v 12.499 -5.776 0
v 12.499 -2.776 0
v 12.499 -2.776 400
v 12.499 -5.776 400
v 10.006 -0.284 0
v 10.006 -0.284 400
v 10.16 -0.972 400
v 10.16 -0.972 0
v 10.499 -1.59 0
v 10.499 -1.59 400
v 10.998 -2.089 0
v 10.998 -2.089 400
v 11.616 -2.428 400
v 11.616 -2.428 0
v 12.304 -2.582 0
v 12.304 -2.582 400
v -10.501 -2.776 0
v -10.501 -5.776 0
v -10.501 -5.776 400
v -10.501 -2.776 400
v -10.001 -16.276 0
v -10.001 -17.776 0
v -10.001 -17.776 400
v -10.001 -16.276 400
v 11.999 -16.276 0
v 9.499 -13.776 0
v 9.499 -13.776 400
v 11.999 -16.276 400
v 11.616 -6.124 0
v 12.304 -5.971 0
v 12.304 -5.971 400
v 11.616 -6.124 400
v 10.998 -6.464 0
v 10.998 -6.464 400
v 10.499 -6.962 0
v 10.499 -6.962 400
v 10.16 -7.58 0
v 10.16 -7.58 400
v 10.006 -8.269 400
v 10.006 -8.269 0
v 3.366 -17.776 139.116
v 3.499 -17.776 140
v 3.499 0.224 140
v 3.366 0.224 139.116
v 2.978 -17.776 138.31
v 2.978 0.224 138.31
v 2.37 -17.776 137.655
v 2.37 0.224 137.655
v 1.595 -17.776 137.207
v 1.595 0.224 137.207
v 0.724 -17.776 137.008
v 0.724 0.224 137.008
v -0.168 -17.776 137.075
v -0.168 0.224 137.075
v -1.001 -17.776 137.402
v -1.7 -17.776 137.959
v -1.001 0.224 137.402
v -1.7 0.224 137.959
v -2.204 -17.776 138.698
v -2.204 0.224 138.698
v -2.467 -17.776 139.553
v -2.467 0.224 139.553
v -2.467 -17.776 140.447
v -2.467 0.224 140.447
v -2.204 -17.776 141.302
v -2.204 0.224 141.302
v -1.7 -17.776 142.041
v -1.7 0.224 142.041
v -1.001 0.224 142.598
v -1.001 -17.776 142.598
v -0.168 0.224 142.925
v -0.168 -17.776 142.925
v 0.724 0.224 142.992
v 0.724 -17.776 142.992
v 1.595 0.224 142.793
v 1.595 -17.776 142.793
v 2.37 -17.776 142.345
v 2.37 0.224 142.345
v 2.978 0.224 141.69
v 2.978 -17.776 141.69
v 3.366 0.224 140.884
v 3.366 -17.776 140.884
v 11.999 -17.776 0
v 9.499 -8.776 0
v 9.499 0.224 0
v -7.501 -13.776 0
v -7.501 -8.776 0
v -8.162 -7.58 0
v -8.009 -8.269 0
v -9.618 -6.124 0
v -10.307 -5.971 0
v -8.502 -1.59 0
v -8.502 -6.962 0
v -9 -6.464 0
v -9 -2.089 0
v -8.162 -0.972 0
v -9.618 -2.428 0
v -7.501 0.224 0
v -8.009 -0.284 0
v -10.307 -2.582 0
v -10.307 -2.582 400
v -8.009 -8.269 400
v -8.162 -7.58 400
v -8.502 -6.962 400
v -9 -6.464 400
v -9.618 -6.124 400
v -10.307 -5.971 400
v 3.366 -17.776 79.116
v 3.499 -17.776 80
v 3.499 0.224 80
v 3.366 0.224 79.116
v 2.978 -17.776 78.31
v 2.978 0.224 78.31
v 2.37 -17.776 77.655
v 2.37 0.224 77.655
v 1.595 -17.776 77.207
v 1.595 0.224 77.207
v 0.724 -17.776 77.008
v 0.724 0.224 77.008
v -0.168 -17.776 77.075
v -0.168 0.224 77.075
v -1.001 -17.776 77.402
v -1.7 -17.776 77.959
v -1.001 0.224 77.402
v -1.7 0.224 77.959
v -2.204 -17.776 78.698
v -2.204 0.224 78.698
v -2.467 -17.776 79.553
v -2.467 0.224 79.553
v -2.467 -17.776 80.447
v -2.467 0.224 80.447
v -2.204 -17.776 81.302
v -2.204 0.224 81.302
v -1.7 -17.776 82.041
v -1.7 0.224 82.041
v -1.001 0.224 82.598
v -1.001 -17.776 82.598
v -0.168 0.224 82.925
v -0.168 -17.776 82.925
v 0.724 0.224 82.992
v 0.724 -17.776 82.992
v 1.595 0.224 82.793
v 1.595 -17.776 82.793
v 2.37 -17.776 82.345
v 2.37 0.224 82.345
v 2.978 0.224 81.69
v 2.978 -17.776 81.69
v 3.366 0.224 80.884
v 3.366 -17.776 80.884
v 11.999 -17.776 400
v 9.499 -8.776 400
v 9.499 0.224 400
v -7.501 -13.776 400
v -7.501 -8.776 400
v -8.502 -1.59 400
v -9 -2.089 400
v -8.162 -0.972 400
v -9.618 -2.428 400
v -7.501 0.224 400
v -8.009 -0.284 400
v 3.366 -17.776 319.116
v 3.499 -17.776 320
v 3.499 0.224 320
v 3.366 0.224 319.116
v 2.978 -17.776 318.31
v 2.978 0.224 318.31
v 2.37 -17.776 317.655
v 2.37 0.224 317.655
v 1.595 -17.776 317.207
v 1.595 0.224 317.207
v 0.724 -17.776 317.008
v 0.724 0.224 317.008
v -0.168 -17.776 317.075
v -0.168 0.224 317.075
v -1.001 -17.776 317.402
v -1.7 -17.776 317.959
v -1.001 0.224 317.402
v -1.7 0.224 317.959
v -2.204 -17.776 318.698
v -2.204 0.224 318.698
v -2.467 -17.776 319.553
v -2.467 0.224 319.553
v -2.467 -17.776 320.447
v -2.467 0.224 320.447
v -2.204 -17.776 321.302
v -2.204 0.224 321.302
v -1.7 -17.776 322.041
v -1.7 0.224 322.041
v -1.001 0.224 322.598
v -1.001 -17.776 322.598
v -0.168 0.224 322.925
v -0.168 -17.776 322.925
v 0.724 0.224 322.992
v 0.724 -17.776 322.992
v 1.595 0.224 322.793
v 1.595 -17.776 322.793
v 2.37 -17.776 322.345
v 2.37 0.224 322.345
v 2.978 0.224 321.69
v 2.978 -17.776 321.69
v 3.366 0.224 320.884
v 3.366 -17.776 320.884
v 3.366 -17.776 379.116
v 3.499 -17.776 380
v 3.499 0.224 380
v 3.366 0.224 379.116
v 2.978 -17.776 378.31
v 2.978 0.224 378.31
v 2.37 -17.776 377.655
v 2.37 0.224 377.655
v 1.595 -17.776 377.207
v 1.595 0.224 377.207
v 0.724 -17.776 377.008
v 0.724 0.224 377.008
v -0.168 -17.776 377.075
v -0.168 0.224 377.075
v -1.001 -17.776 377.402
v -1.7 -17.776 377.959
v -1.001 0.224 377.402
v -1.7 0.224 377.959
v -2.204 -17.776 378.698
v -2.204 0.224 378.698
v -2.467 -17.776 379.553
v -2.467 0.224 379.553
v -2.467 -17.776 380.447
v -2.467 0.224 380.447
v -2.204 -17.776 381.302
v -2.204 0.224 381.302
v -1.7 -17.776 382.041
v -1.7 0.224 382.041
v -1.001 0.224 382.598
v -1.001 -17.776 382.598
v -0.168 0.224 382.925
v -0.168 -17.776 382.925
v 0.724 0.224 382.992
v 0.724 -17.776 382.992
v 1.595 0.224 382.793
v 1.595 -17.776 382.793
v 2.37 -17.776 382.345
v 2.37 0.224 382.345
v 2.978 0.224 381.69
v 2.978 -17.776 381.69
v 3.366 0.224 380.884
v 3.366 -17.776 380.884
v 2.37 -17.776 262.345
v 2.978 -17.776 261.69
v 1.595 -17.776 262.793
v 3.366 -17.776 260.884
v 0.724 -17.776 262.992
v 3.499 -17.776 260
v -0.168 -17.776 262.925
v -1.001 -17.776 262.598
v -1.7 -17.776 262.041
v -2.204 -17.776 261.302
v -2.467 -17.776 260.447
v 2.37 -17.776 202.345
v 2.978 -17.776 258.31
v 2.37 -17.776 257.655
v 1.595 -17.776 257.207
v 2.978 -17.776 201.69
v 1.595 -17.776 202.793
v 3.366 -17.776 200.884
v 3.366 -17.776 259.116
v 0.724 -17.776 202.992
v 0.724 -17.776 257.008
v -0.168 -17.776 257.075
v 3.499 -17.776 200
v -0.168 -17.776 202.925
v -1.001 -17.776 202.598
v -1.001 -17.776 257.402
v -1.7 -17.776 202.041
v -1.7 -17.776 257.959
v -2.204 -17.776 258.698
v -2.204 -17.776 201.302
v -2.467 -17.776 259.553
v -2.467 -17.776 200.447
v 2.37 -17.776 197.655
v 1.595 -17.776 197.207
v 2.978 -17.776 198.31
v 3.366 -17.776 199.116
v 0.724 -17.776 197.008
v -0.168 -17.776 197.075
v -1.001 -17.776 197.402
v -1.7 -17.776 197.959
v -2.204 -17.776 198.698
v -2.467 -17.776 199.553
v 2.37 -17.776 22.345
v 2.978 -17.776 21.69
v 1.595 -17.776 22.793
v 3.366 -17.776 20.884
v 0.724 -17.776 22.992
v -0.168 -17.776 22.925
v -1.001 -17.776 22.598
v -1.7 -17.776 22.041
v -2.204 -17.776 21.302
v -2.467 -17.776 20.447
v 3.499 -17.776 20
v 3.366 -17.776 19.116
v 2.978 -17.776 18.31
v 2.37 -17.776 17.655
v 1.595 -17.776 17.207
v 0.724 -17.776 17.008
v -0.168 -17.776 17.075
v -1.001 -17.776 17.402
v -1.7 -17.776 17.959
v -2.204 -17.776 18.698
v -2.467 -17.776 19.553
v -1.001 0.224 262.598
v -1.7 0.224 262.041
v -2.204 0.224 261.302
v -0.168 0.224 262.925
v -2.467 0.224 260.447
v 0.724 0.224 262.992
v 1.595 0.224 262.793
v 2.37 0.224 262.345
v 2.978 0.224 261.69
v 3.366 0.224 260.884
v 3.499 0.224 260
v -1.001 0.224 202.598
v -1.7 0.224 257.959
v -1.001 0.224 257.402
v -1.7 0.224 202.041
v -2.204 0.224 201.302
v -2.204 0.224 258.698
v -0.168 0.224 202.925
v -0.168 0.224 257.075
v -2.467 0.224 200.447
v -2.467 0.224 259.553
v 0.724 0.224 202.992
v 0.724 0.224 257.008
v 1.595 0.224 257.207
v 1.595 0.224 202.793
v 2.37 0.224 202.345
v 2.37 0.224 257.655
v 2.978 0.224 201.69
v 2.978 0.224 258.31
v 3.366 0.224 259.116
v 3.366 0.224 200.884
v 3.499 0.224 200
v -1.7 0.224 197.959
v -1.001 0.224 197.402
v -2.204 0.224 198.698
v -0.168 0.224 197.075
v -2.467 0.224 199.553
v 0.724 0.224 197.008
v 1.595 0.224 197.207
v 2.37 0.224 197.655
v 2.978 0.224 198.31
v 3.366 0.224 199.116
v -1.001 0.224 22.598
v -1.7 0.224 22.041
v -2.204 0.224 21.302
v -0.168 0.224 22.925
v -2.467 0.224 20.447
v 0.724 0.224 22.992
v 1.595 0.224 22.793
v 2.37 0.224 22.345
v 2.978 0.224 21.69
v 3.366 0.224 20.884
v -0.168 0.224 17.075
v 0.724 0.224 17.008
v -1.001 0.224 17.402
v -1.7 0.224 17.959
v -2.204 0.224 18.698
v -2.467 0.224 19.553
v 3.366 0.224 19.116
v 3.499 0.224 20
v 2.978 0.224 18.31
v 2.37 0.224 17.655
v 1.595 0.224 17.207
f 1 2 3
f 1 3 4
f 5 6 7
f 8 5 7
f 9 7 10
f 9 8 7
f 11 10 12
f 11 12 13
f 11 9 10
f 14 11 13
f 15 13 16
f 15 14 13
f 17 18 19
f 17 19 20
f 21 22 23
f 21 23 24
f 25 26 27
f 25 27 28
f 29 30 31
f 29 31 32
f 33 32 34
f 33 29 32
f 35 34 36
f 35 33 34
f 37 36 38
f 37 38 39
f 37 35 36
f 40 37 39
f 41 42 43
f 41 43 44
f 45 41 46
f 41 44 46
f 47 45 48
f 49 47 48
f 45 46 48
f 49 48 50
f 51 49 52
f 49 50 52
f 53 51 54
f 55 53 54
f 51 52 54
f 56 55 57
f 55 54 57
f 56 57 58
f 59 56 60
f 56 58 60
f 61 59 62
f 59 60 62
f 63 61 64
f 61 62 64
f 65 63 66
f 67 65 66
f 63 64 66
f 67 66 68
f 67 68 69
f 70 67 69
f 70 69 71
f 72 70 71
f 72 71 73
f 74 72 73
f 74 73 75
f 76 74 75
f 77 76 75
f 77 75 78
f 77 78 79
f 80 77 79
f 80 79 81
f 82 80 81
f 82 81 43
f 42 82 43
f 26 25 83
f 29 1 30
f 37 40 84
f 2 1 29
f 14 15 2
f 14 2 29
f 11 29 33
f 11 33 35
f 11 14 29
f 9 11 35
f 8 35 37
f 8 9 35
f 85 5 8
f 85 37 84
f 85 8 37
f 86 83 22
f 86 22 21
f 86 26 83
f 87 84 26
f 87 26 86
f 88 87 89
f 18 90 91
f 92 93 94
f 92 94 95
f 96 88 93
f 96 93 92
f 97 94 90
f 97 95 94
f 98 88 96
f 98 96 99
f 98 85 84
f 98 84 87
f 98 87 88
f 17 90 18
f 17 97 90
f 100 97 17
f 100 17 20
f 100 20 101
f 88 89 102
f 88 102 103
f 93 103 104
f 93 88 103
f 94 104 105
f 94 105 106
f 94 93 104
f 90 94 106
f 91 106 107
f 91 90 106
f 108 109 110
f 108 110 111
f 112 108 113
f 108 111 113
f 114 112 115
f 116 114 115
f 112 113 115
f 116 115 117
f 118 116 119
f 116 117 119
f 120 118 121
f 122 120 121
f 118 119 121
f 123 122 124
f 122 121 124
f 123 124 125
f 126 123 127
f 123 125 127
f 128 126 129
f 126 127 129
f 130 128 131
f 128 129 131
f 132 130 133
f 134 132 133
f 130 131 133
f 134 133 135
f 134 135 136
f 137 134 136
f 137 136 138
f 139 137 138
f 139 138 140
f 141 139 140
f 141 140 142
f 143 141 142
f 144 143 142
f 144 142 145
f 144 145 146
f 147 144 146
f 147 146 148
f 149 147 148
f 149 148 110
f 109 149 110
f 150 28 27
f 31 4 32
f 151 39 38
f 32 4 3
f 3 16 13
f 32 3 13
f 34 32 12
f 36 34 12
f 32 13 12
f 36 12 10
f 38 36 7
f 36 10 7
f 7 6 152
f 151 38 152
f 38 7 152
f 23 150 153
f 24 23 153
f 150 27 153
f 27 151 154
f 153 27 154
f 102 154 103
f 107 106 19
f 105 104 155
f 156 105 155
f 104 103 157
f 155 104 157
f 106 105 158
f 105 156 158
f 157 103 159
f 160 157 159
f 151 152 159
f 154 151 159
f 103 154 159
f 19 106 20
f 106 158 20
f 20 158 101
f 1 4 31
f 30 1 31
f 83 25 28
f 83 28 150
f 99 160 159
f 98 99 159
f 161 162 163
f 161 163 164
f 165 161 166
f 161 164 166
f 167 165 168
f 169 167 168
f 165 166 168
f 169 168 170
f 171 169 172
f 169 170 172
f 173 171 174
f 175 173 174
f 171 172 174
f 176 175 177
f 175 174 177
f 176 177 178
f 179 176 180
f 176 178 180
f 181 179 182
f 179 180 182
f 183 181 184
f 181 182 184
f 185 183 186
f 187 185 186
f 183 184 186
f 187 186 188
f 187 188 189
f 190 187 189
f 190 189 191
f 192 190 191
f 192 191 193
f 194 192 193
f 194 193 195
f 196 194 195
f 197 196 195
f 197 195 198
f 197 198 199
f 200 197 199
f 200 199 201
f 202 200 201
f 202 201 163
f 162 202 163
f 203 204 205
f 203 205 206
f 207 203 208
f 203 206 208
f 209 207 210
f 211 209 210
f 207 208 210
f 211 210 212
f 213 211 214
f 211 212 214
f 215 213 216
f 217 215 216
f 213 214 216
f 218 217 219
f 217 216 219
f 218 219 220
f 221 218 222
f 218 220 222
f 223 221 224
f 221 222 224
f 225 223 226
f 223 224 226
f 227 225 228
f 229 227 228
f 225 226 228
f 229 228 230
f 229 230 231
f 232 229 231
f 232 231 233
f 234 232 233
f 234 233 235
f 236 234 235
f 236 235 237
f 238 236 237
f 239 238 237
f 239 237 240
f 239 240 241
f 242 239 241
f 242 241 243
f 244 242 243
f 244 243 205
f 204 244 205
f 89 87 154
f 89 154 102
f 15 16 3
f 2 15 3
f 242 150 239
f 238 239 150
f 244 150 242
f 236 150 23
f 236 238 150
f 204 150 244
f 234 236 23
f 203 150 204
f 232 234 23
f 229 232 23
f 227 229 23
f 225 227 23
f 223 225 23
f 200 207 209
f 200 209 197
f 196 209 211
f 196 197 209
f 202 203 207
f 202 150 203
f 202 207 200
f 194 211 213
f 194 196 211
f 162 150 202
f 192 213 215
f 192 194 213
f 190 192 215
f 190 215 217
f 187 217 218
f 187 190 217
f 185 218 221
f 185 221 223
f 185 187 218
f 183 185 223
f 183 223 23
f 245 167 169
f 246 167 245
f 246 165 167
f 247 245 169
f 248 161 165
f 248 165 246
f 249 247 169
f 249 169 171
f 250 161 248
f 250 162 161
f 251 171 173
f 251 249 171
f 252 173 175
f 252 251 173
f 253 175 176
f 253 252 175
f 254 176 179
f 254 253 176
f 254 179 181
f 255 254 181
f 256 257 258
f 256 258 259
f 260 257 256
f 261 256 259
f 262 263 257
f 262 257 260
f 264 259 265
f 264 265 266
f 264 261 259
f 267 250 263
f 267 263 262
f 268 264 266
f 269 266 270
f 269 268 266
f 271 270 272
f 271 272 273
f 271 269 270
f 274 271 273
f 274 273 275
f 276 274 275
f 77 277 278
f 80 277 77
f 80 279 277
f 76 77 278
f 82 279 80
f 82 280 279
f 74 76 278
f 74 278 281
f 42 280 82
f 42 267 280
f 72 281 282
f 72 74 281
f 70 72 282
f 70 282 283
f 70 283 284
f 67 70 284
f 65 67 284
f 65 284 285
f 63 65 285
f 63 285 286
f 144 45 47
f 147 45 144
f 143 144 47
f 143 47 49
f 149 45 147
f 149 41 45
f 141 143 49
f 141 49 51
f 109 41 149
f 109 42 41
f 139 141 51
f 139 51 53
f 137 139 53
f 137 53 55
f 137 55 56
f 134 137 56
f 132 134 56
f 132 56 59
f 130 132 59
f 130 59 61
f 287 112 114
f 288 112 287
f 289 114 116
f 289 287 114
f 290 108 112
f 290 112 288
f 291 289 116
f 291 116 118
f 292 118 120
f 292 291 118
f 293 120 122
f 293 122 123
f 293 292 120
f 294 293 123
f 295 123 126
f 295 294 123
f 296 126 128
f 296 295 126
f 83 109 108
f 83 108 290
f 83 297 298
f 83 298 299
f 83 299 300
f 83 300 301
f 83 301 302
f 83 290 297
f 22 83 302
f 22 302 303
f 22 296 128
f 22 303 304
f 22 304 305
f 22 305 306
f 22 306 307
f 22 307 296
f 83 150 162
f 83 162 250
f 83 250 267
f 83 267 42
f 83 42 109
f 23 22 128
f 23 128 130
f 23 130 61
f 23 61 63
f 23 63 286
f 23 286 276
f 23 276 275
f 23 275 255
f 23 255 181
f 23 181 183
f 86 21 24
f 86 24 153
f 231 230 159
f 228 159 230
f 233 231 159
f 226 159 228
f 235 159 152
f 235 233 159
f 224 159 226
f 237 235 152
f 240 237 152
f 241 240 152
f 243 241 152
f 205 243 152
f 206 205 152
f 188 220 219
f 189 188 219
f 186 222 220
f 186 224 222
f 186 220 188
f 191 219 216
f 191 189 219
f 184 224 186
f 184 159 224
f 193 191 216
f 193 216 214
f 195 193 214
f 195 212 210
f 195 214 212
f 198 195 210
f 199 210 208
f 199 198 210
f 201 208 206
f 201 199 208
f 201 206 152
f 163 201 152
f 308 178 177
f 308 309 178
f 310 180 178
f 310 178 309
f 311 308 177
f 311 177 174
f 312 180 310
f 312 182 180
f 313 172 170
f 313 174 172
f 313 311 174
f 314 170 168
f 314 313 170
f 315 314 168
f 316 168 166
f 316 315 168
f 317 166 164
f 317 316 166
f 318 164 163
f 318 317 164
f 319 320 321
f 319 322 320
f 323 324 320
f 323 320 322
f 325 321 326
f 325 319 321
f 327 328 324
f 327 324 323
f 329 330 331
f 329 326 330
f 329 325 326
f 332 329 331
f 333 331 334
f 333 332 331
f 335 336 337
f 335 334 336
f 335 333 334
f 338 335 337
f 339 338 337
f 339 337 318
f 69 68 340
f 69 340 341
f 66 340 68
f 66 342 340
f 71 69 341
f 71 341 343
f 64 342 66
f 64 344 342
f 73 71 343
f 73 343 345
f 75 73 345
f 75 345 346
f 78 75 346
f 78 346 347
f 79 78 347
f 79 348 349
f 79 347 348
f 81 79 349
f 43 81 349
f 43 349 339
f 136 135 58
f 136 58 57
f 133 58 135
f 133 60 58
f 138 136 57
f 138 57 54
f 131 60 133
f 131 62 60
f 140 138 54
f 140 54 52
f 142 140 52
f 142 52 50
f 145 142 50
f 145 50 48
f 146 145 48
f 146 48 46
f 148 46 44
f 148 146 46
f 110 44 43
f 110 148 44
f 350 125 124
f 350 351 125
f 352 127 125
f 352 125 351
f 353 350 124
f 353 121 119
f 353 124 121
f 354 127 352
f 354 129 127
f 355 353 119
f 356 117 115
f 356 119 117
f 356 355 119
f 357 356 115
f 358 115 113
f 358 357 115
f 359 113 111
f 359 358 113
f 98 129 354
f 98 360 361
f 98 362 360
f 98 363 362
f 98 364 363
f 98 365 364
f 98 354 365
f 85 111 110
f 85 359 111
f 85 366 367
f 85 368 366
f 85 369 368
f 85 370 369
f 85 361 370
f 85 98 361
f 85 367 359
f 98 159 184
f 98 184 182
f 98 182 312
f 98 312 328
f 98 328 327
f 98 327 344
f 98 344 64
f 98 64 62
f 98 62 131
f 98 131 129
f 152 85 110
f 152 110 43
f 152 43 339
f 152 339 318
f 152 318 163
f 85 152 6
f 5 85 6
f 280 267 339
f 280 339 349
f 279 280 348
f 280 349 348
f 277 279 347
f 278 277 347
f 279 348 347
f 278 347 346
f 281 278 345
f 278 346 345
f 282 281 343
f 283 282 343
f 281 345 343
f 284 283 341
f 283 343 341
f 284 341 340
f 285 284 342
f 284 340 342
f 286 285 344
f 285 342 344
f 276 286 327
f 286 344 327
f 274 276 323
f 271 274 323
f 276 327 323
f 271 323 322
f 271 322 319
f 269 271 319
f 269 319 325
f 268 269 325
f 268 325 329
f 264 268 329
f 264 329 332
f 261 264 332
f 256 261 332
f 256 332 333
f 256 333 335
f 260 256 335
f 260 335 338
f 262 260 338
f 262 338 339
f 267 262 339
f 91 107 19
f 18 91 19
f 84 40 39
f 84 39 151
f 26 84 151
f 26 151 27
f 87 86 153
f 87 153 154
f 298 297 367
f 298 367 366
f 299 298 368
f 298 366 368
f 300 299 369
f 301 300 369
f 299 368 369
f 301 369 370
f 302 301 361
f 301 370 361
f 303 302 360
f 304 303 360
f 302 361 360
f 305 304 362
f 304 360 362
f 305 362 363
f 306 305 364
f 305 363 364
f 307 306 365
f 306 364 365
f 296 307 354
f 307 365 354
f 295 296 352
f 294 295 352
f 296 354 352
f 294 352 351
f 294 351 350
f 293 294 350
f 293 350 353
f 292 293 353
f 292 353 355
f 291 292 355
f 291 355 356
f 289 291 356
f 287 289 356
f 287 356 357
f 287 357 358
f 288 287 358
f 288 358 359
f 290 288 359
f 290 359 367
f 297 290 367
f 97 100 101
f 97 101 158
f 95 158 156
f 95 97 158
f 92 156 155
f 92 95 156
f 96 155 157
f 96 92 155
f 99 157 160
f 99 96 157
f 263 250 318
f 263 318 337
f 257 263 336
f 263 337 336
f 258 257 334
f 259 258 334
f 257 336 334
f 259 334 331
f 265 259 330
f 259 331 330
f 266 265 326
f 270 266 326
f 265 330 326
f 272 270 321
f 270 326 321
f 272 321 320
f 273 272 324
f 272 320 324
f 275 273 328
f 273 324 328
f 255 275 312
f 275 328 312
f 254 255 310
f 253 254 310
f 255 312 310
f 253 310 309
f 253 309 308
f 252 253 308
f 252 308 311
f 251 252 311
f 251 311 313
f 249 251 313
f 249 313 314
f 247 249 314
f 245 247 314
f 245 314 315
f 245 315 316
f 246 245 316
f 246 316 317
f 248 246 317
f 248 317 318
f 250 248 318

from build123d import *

# Parameters (mm, degrees)
ESTRUSIONE_ESTRUSIONE1_DEPTH      = 400
SCHIZZO2_R                        = 3
TAGLIO_ESTRUSIONE1_DEPTH          = 19
RIPETIZIONE_A_L1_COUNT            = 4
RIPETIZIONE_A_L1_PITCH            = 60
RIPETIZIONE_A_L2_COPY_1_SKETCH_R  = 3
RIPETIZIONE_A_L2_COPY_1_DEPTH     = 19
RIPETIZIONE_A_L2_COPY_2_SKETCH_R  = 3
RIPETIZIONE_A_L2_COPY_2_DEPTH     = 19
RIPETIZIONE_A_L2_COPY_3_SKETCH_R  = 3
RIPETIZIONE_A_L2_COPY_3_DEPTH     = 19
RIPETIZIONE_A_L2_COPY_4_SKETCH_R  = 3
RIPETIZIONE_A_L2_COPY_4_DEPTH     = 19
RIPETIZIONE_A_L2_COPY_5_SKETCH_R  = 3
RIPETIZIONE_A_L2_COPY_5_DEPTH     = 19
RIPETIZIONE_A_L2_COPY_6_SKETCH_R  = 3
RIPETIZIONE_A_L2_COPY_6_DEPTH     = 19
RIPETIZIONE_A_L2_COPY_7_SKETCH_R  = 3
RIPETIZIONE_A_L2_COPY_7_DEPTH     = 19
RIPETIZIONE_A_L2_COPY_8_SKETCH_R  = 3
RIPETIZIONE_A_L2_COPY_8_DEPTH     = 19
RIPETIZIONE_A_L2_COPY_9_SKETCH_R  = 3
RIPETIZIONE_A_L2_COPY_9_DEPTH     = 19
RIPETIZIONE_A_L2_COPY_10_SKETCH_R = 3
RIPETIZIONE_A_L2_COPY_10_DEPTH    = 19
RIPETIZIONE_A_L2_COPY_11_SKETCH_R = 3
RIPETIZIONE_A_L2_COPY_11_DEPTH    = 19
RIPETIZIONE_A_L2_COPY_12_SKETCH_R = 3
RIPETIZIONE_A_L2_COPY_12_DEPTH    = 19


with BuildPart() as part:
    # Schizzo1 → Estrusione-Estrusione1 (new body)
    with BuildSketch(Plane.XY):
        with BuildLine():
            Line((-10.001211602, -16.276222172), (-7.501211602, -13.776222172))
            Line((-7.501211602, -13.776222172), (-7.501211602, -8.776222172))
            Line((-7.501211602, -8.776222172), (-8.008796188, -8.268637585))
            ThreePointArc((-8.008796188, -8.268637585), (-8.733444649, -6.695460987), (-10.306621247, -5.970812526))
            Line((-10.306621247, -5.970812526), (-10.501211602, -5.776222172))
            Line((-10.501211602, -5.776222172), (-10.501211602, -2.776222172))
            Line((-10.501211602, -2.776222172), (-10.306621247, -2.581631817))
            ThreePointArc((-10.306621247, -2.581631817), (-8.733444649, -1.856983356), (-8.008796188, -0.283806758))
            Line((-8.008796188, -0.283806758), (-7.501211602, 0.223777828))
            Line((-7.501211602, 0.223777828), (9.498788398, 0.223777828))
            Line((9.498788398, 0.223777828), (10.006372984, -0.283806758))
            ThreePointArc((10.006372984, -0.283806758), (10.731021445, -1.856983356), (12.304198043, -2.581631817))
            Line((12.304198043, -2.581631817), (12.498788398, -2.776222172))
            Line((12.498788398, -2.776222172), (12.498788398, -5.776222172))
            Line((12.498788398, -5.776222172), (12.304198043, -5.970812526))
            ThreePointArc((12.304198043, -5.970812526), (10.731021445, -6.695460987), (10.006372984, -8.268637585))
            Line((10.006372984, -8.268637585), (9.498788398, -8.776222172))
            Line((9.498788398, -8.776222172), (9.498788398, -13.776222172))
            Line((9.498788398, -13.776222172), (11.998788398, -16.276222172))
            Line((11.998788398, -16.276222172), (11.998788398, -17.776222172))
            Line((11.998788398, -17.776222172), (-10.001211602, -17.776222172))
            Line((-10.001211602, -17.776222172), (-10.001211602, -16.276222172))
        make_face()
    extrude(amount=ESTRUSIONE_ESTRUSIONE1_DEPTH)

    # Schizzo2 → Taglio-Estrusione1 (cut, through all)
    with BuildSketch(Plane(origin=(0, 0.223777828, 0), x_dir=(1, 0, 0), z_dir=(0, 1, 0))):
        with Locations((0.499394199, -200)):
            Circle(SCHIZZO2_R)
    taglio_estrusione1 = extrude(amount=-TAGLIO_ESTRUSIONE1_DEPTH, mode=Mode.SUBTRACT)

    # Ripetizione a L1: Taglio-Estrusione1 ×4
    with Locations(*[(0, 0, i * RIPETIZIONE_A_L1_PITCH) for i in range(1, RIPETIZIONE_A_L1_COUNT)]):
        add(taglio_estrusione1, mode=Mode.SUBTRACT)

    # Ripetizione a L2 copy 1 sketch → Ripetizione a L2 copy 1 (cut, through all)
    with BuildSketch(Plane(origin=(0, 0.223777828, 0), x_dir=(1, 0, 0), z_dir=(0, 1, 0))):
        with Locations((0.499394199, -200)):
            Circle(RIPETIZIONE_A_L2_COPY_1_SKETCH_R)
    extrude(amount=-RIPETIZIONE_A_L2_COPY_1_DEPTH, mode=Mode.SUBTRACT)

    # Ripetizione a L2 copy 2 sketch → Ripetizione a L2 copy 2 (cut, through all)
    with BuildSketch(Plane(origin=(0, 0.223777828, -60), x_dir=(1, 0, 0), z_dir=(0, 1, 0))):
        with Locations((0.499394199, -200)):
            Circle(RIPETIZIONE_A_L2_COPY_2_SKETCH_R)
    extrude(amount=-RIPETIZIONE_A_L2_COPY_2_DEPTH, mode=Mode.SUBTRACT)

    # Ripetizione a L2 copy 3 sketch → Ripetizione a L2 copy 3 (cut, through all)
    with BuildSketch(Plane(origin=(0, 0.223777828, -120), x_dir=(1, 0, 0), z_dir=(0, 1, 0))):
        with Locations((0.499394199, -200)):
            Circle(RIPETIZIONE_A_L2_COPY_3_SKETCH_R)
    extrude(amount=-RIPETIZIONE_A_L2_COPY_3_DEPTH, mode=Mode.SUBTRACT)

    # Ripetizione a L2 copy 4 sketch → Ripetizione a L2 copy 4 (cut, through all)
    with BuildSketch(Plane(origin=(0, 0.223777828, 60), x_dir=(1, 0, 0), z_dir=(0, 1, 0))):
        with Locations((0.499394199, -200)):
            Circle(RIPETIZIONE_A_L2_COPY_4_SKETCH_R)
    extrude(amount=-RIPETIZIONE_A_L2_COPY_4_DEPTH, mode=Mode.SUBTRACT)

    # Ripetizione a L2 copy 5 sketch → Ripetizione a L2 copy 5 (cut, through all)
    with BuildSketch(Plane(origin=(0, 0.223777828, 0), x_dir=(1, 0, 0), z_dir=(0, 1, 0))):
        with Locations((0.499394199, -200)):
            Circle(RIPETIZIONE_A_L2_COPY_5_SKETCH_R)
    extrude(amount=-RIPETIZIONE_A_L2_COPY_5_DEPTH, mode=Mode.SUBTRACT)

    # Ripetizione a L2 copy 6 sketch → Ripetizione a L2 copy 6 (cut, through all)
    with BuildSketch(Plane(origin=(0, 0.223777828, -60), x_dir=(1, 0, 0), z_dir=(0, 1, 0))):
        with Locations((0.499394199, -200)):
            Circle(RIPETIZIONE_A_L2_COPY_6_SKETCH_R)
    extrude(amount=-RIPETIZIONE_A_L2_COPY_6_DEPTH, mode=Mode.SUBTRACT)

    # Ripetizione a L2 copy 7 sketch → Ripetizione a L2 copy 7 (cut, through all)
    with BuildSketch(Plane(origin=(0, 0.223777828, 120), x_dir=(1, 0, 0), z_dir=(0, 1, 0))):
        with Locations((0.499394199, -200)):
            Circle(RIPETIZIONE_A_L2_COPY_7_SKETCH_R)
    extrude(amount=-RIPETIZIONE_A_L2_COPY_7_DEPTH, mode=Mode.SUBTRACT)

    # Ripetizione a L2 copy 8 sketch → Ripetizione a L2 copy 8 (cut, through all)
    with BuildSketch(Plane(origin=(0, 0.223777828, 60), x_dir=(1, 0, 0), z_dir=(0, 1, 0))):
        with Locations((0.499394199, -200)):
            Circle(RIPETIZIONE_A_L2_COPY_8_SKETCH_R)
    extrude(amount=-RIPETIZIONE_A_L2_COPY_8_DEPTH, mode=Mode.SUBTRACT)

    # Ripetizione a L2 copy 9 sketch → Ripetizione a L2 copy 9 (cut, through all)
    with BuildSketch(Plane(origin=(0, 0.223777828, 0), x_dir=(1, 0, 0), z_dir=(0, 1, 0))):
        with Locations((0.499394199, -200)):
            Circle(RIPETIZIONE_A_L2_COPY_9_SKETCH_R)
    extrude(amount=-RIPETIZIONE_A_L2_COPY_9_DEPTH, mode=Mode.SUBTRACT)

    # Ripetizione a L2 copy 10 sketch → Ripetizione a L2 copy 10 (cut, through all)
    with BuildSketch(Plane(origin=(0, 0.223777828, -60), x_dir=(1, 0, 0), z_dir=(0, 1, 0))):
        with Locations((0.499394199, -200)):
            Circle(RIPETIZIONE_A_L2_COPY_10_SKETCH_R)
    extrude(amount=-RIPETIZIONE_A_L2_COPY_10_DEPTH, mode=Mode.SUBTRACT)

    # Ripetizione a L2 copy 11 sketch → Ripetizione a L2 copy 11 (cut, through all)
    with BuildSketch(Plane(origin=(0, 0.223777828, -120), x_dir=(1, 0, 0), z_dir=(0, 1, 0))):
        with Locations((0.499394199, -200)):
            Circle(RIPETIZIONE_A_L2_COPY_11_SKETCH_R)
    extrude(amount=-RIPETIZIONE_A_L2_COPY_11_DEPTH, mode=Mode.SUBTRACT)

    # Ripetizione a L2 copy 12 sketch → Ripetizione a L2 copy 12 (cut, through all)
    with BuildSketch(Plane(origin=(0, 0.223777828, -180), x_dir=(1, 0, 0), z_dir=(0, 1, 0))):
        with Locations((0.499394199, -200)):
            Circle(RIPETIZIONE_A_L2_COPY_12_SKETCH_R)
    extrude(amount=-RIPETIZIONE_A_L2_COPY_12_DEPTH, mode=Mode.SUBTRACT)


solid = part.part
